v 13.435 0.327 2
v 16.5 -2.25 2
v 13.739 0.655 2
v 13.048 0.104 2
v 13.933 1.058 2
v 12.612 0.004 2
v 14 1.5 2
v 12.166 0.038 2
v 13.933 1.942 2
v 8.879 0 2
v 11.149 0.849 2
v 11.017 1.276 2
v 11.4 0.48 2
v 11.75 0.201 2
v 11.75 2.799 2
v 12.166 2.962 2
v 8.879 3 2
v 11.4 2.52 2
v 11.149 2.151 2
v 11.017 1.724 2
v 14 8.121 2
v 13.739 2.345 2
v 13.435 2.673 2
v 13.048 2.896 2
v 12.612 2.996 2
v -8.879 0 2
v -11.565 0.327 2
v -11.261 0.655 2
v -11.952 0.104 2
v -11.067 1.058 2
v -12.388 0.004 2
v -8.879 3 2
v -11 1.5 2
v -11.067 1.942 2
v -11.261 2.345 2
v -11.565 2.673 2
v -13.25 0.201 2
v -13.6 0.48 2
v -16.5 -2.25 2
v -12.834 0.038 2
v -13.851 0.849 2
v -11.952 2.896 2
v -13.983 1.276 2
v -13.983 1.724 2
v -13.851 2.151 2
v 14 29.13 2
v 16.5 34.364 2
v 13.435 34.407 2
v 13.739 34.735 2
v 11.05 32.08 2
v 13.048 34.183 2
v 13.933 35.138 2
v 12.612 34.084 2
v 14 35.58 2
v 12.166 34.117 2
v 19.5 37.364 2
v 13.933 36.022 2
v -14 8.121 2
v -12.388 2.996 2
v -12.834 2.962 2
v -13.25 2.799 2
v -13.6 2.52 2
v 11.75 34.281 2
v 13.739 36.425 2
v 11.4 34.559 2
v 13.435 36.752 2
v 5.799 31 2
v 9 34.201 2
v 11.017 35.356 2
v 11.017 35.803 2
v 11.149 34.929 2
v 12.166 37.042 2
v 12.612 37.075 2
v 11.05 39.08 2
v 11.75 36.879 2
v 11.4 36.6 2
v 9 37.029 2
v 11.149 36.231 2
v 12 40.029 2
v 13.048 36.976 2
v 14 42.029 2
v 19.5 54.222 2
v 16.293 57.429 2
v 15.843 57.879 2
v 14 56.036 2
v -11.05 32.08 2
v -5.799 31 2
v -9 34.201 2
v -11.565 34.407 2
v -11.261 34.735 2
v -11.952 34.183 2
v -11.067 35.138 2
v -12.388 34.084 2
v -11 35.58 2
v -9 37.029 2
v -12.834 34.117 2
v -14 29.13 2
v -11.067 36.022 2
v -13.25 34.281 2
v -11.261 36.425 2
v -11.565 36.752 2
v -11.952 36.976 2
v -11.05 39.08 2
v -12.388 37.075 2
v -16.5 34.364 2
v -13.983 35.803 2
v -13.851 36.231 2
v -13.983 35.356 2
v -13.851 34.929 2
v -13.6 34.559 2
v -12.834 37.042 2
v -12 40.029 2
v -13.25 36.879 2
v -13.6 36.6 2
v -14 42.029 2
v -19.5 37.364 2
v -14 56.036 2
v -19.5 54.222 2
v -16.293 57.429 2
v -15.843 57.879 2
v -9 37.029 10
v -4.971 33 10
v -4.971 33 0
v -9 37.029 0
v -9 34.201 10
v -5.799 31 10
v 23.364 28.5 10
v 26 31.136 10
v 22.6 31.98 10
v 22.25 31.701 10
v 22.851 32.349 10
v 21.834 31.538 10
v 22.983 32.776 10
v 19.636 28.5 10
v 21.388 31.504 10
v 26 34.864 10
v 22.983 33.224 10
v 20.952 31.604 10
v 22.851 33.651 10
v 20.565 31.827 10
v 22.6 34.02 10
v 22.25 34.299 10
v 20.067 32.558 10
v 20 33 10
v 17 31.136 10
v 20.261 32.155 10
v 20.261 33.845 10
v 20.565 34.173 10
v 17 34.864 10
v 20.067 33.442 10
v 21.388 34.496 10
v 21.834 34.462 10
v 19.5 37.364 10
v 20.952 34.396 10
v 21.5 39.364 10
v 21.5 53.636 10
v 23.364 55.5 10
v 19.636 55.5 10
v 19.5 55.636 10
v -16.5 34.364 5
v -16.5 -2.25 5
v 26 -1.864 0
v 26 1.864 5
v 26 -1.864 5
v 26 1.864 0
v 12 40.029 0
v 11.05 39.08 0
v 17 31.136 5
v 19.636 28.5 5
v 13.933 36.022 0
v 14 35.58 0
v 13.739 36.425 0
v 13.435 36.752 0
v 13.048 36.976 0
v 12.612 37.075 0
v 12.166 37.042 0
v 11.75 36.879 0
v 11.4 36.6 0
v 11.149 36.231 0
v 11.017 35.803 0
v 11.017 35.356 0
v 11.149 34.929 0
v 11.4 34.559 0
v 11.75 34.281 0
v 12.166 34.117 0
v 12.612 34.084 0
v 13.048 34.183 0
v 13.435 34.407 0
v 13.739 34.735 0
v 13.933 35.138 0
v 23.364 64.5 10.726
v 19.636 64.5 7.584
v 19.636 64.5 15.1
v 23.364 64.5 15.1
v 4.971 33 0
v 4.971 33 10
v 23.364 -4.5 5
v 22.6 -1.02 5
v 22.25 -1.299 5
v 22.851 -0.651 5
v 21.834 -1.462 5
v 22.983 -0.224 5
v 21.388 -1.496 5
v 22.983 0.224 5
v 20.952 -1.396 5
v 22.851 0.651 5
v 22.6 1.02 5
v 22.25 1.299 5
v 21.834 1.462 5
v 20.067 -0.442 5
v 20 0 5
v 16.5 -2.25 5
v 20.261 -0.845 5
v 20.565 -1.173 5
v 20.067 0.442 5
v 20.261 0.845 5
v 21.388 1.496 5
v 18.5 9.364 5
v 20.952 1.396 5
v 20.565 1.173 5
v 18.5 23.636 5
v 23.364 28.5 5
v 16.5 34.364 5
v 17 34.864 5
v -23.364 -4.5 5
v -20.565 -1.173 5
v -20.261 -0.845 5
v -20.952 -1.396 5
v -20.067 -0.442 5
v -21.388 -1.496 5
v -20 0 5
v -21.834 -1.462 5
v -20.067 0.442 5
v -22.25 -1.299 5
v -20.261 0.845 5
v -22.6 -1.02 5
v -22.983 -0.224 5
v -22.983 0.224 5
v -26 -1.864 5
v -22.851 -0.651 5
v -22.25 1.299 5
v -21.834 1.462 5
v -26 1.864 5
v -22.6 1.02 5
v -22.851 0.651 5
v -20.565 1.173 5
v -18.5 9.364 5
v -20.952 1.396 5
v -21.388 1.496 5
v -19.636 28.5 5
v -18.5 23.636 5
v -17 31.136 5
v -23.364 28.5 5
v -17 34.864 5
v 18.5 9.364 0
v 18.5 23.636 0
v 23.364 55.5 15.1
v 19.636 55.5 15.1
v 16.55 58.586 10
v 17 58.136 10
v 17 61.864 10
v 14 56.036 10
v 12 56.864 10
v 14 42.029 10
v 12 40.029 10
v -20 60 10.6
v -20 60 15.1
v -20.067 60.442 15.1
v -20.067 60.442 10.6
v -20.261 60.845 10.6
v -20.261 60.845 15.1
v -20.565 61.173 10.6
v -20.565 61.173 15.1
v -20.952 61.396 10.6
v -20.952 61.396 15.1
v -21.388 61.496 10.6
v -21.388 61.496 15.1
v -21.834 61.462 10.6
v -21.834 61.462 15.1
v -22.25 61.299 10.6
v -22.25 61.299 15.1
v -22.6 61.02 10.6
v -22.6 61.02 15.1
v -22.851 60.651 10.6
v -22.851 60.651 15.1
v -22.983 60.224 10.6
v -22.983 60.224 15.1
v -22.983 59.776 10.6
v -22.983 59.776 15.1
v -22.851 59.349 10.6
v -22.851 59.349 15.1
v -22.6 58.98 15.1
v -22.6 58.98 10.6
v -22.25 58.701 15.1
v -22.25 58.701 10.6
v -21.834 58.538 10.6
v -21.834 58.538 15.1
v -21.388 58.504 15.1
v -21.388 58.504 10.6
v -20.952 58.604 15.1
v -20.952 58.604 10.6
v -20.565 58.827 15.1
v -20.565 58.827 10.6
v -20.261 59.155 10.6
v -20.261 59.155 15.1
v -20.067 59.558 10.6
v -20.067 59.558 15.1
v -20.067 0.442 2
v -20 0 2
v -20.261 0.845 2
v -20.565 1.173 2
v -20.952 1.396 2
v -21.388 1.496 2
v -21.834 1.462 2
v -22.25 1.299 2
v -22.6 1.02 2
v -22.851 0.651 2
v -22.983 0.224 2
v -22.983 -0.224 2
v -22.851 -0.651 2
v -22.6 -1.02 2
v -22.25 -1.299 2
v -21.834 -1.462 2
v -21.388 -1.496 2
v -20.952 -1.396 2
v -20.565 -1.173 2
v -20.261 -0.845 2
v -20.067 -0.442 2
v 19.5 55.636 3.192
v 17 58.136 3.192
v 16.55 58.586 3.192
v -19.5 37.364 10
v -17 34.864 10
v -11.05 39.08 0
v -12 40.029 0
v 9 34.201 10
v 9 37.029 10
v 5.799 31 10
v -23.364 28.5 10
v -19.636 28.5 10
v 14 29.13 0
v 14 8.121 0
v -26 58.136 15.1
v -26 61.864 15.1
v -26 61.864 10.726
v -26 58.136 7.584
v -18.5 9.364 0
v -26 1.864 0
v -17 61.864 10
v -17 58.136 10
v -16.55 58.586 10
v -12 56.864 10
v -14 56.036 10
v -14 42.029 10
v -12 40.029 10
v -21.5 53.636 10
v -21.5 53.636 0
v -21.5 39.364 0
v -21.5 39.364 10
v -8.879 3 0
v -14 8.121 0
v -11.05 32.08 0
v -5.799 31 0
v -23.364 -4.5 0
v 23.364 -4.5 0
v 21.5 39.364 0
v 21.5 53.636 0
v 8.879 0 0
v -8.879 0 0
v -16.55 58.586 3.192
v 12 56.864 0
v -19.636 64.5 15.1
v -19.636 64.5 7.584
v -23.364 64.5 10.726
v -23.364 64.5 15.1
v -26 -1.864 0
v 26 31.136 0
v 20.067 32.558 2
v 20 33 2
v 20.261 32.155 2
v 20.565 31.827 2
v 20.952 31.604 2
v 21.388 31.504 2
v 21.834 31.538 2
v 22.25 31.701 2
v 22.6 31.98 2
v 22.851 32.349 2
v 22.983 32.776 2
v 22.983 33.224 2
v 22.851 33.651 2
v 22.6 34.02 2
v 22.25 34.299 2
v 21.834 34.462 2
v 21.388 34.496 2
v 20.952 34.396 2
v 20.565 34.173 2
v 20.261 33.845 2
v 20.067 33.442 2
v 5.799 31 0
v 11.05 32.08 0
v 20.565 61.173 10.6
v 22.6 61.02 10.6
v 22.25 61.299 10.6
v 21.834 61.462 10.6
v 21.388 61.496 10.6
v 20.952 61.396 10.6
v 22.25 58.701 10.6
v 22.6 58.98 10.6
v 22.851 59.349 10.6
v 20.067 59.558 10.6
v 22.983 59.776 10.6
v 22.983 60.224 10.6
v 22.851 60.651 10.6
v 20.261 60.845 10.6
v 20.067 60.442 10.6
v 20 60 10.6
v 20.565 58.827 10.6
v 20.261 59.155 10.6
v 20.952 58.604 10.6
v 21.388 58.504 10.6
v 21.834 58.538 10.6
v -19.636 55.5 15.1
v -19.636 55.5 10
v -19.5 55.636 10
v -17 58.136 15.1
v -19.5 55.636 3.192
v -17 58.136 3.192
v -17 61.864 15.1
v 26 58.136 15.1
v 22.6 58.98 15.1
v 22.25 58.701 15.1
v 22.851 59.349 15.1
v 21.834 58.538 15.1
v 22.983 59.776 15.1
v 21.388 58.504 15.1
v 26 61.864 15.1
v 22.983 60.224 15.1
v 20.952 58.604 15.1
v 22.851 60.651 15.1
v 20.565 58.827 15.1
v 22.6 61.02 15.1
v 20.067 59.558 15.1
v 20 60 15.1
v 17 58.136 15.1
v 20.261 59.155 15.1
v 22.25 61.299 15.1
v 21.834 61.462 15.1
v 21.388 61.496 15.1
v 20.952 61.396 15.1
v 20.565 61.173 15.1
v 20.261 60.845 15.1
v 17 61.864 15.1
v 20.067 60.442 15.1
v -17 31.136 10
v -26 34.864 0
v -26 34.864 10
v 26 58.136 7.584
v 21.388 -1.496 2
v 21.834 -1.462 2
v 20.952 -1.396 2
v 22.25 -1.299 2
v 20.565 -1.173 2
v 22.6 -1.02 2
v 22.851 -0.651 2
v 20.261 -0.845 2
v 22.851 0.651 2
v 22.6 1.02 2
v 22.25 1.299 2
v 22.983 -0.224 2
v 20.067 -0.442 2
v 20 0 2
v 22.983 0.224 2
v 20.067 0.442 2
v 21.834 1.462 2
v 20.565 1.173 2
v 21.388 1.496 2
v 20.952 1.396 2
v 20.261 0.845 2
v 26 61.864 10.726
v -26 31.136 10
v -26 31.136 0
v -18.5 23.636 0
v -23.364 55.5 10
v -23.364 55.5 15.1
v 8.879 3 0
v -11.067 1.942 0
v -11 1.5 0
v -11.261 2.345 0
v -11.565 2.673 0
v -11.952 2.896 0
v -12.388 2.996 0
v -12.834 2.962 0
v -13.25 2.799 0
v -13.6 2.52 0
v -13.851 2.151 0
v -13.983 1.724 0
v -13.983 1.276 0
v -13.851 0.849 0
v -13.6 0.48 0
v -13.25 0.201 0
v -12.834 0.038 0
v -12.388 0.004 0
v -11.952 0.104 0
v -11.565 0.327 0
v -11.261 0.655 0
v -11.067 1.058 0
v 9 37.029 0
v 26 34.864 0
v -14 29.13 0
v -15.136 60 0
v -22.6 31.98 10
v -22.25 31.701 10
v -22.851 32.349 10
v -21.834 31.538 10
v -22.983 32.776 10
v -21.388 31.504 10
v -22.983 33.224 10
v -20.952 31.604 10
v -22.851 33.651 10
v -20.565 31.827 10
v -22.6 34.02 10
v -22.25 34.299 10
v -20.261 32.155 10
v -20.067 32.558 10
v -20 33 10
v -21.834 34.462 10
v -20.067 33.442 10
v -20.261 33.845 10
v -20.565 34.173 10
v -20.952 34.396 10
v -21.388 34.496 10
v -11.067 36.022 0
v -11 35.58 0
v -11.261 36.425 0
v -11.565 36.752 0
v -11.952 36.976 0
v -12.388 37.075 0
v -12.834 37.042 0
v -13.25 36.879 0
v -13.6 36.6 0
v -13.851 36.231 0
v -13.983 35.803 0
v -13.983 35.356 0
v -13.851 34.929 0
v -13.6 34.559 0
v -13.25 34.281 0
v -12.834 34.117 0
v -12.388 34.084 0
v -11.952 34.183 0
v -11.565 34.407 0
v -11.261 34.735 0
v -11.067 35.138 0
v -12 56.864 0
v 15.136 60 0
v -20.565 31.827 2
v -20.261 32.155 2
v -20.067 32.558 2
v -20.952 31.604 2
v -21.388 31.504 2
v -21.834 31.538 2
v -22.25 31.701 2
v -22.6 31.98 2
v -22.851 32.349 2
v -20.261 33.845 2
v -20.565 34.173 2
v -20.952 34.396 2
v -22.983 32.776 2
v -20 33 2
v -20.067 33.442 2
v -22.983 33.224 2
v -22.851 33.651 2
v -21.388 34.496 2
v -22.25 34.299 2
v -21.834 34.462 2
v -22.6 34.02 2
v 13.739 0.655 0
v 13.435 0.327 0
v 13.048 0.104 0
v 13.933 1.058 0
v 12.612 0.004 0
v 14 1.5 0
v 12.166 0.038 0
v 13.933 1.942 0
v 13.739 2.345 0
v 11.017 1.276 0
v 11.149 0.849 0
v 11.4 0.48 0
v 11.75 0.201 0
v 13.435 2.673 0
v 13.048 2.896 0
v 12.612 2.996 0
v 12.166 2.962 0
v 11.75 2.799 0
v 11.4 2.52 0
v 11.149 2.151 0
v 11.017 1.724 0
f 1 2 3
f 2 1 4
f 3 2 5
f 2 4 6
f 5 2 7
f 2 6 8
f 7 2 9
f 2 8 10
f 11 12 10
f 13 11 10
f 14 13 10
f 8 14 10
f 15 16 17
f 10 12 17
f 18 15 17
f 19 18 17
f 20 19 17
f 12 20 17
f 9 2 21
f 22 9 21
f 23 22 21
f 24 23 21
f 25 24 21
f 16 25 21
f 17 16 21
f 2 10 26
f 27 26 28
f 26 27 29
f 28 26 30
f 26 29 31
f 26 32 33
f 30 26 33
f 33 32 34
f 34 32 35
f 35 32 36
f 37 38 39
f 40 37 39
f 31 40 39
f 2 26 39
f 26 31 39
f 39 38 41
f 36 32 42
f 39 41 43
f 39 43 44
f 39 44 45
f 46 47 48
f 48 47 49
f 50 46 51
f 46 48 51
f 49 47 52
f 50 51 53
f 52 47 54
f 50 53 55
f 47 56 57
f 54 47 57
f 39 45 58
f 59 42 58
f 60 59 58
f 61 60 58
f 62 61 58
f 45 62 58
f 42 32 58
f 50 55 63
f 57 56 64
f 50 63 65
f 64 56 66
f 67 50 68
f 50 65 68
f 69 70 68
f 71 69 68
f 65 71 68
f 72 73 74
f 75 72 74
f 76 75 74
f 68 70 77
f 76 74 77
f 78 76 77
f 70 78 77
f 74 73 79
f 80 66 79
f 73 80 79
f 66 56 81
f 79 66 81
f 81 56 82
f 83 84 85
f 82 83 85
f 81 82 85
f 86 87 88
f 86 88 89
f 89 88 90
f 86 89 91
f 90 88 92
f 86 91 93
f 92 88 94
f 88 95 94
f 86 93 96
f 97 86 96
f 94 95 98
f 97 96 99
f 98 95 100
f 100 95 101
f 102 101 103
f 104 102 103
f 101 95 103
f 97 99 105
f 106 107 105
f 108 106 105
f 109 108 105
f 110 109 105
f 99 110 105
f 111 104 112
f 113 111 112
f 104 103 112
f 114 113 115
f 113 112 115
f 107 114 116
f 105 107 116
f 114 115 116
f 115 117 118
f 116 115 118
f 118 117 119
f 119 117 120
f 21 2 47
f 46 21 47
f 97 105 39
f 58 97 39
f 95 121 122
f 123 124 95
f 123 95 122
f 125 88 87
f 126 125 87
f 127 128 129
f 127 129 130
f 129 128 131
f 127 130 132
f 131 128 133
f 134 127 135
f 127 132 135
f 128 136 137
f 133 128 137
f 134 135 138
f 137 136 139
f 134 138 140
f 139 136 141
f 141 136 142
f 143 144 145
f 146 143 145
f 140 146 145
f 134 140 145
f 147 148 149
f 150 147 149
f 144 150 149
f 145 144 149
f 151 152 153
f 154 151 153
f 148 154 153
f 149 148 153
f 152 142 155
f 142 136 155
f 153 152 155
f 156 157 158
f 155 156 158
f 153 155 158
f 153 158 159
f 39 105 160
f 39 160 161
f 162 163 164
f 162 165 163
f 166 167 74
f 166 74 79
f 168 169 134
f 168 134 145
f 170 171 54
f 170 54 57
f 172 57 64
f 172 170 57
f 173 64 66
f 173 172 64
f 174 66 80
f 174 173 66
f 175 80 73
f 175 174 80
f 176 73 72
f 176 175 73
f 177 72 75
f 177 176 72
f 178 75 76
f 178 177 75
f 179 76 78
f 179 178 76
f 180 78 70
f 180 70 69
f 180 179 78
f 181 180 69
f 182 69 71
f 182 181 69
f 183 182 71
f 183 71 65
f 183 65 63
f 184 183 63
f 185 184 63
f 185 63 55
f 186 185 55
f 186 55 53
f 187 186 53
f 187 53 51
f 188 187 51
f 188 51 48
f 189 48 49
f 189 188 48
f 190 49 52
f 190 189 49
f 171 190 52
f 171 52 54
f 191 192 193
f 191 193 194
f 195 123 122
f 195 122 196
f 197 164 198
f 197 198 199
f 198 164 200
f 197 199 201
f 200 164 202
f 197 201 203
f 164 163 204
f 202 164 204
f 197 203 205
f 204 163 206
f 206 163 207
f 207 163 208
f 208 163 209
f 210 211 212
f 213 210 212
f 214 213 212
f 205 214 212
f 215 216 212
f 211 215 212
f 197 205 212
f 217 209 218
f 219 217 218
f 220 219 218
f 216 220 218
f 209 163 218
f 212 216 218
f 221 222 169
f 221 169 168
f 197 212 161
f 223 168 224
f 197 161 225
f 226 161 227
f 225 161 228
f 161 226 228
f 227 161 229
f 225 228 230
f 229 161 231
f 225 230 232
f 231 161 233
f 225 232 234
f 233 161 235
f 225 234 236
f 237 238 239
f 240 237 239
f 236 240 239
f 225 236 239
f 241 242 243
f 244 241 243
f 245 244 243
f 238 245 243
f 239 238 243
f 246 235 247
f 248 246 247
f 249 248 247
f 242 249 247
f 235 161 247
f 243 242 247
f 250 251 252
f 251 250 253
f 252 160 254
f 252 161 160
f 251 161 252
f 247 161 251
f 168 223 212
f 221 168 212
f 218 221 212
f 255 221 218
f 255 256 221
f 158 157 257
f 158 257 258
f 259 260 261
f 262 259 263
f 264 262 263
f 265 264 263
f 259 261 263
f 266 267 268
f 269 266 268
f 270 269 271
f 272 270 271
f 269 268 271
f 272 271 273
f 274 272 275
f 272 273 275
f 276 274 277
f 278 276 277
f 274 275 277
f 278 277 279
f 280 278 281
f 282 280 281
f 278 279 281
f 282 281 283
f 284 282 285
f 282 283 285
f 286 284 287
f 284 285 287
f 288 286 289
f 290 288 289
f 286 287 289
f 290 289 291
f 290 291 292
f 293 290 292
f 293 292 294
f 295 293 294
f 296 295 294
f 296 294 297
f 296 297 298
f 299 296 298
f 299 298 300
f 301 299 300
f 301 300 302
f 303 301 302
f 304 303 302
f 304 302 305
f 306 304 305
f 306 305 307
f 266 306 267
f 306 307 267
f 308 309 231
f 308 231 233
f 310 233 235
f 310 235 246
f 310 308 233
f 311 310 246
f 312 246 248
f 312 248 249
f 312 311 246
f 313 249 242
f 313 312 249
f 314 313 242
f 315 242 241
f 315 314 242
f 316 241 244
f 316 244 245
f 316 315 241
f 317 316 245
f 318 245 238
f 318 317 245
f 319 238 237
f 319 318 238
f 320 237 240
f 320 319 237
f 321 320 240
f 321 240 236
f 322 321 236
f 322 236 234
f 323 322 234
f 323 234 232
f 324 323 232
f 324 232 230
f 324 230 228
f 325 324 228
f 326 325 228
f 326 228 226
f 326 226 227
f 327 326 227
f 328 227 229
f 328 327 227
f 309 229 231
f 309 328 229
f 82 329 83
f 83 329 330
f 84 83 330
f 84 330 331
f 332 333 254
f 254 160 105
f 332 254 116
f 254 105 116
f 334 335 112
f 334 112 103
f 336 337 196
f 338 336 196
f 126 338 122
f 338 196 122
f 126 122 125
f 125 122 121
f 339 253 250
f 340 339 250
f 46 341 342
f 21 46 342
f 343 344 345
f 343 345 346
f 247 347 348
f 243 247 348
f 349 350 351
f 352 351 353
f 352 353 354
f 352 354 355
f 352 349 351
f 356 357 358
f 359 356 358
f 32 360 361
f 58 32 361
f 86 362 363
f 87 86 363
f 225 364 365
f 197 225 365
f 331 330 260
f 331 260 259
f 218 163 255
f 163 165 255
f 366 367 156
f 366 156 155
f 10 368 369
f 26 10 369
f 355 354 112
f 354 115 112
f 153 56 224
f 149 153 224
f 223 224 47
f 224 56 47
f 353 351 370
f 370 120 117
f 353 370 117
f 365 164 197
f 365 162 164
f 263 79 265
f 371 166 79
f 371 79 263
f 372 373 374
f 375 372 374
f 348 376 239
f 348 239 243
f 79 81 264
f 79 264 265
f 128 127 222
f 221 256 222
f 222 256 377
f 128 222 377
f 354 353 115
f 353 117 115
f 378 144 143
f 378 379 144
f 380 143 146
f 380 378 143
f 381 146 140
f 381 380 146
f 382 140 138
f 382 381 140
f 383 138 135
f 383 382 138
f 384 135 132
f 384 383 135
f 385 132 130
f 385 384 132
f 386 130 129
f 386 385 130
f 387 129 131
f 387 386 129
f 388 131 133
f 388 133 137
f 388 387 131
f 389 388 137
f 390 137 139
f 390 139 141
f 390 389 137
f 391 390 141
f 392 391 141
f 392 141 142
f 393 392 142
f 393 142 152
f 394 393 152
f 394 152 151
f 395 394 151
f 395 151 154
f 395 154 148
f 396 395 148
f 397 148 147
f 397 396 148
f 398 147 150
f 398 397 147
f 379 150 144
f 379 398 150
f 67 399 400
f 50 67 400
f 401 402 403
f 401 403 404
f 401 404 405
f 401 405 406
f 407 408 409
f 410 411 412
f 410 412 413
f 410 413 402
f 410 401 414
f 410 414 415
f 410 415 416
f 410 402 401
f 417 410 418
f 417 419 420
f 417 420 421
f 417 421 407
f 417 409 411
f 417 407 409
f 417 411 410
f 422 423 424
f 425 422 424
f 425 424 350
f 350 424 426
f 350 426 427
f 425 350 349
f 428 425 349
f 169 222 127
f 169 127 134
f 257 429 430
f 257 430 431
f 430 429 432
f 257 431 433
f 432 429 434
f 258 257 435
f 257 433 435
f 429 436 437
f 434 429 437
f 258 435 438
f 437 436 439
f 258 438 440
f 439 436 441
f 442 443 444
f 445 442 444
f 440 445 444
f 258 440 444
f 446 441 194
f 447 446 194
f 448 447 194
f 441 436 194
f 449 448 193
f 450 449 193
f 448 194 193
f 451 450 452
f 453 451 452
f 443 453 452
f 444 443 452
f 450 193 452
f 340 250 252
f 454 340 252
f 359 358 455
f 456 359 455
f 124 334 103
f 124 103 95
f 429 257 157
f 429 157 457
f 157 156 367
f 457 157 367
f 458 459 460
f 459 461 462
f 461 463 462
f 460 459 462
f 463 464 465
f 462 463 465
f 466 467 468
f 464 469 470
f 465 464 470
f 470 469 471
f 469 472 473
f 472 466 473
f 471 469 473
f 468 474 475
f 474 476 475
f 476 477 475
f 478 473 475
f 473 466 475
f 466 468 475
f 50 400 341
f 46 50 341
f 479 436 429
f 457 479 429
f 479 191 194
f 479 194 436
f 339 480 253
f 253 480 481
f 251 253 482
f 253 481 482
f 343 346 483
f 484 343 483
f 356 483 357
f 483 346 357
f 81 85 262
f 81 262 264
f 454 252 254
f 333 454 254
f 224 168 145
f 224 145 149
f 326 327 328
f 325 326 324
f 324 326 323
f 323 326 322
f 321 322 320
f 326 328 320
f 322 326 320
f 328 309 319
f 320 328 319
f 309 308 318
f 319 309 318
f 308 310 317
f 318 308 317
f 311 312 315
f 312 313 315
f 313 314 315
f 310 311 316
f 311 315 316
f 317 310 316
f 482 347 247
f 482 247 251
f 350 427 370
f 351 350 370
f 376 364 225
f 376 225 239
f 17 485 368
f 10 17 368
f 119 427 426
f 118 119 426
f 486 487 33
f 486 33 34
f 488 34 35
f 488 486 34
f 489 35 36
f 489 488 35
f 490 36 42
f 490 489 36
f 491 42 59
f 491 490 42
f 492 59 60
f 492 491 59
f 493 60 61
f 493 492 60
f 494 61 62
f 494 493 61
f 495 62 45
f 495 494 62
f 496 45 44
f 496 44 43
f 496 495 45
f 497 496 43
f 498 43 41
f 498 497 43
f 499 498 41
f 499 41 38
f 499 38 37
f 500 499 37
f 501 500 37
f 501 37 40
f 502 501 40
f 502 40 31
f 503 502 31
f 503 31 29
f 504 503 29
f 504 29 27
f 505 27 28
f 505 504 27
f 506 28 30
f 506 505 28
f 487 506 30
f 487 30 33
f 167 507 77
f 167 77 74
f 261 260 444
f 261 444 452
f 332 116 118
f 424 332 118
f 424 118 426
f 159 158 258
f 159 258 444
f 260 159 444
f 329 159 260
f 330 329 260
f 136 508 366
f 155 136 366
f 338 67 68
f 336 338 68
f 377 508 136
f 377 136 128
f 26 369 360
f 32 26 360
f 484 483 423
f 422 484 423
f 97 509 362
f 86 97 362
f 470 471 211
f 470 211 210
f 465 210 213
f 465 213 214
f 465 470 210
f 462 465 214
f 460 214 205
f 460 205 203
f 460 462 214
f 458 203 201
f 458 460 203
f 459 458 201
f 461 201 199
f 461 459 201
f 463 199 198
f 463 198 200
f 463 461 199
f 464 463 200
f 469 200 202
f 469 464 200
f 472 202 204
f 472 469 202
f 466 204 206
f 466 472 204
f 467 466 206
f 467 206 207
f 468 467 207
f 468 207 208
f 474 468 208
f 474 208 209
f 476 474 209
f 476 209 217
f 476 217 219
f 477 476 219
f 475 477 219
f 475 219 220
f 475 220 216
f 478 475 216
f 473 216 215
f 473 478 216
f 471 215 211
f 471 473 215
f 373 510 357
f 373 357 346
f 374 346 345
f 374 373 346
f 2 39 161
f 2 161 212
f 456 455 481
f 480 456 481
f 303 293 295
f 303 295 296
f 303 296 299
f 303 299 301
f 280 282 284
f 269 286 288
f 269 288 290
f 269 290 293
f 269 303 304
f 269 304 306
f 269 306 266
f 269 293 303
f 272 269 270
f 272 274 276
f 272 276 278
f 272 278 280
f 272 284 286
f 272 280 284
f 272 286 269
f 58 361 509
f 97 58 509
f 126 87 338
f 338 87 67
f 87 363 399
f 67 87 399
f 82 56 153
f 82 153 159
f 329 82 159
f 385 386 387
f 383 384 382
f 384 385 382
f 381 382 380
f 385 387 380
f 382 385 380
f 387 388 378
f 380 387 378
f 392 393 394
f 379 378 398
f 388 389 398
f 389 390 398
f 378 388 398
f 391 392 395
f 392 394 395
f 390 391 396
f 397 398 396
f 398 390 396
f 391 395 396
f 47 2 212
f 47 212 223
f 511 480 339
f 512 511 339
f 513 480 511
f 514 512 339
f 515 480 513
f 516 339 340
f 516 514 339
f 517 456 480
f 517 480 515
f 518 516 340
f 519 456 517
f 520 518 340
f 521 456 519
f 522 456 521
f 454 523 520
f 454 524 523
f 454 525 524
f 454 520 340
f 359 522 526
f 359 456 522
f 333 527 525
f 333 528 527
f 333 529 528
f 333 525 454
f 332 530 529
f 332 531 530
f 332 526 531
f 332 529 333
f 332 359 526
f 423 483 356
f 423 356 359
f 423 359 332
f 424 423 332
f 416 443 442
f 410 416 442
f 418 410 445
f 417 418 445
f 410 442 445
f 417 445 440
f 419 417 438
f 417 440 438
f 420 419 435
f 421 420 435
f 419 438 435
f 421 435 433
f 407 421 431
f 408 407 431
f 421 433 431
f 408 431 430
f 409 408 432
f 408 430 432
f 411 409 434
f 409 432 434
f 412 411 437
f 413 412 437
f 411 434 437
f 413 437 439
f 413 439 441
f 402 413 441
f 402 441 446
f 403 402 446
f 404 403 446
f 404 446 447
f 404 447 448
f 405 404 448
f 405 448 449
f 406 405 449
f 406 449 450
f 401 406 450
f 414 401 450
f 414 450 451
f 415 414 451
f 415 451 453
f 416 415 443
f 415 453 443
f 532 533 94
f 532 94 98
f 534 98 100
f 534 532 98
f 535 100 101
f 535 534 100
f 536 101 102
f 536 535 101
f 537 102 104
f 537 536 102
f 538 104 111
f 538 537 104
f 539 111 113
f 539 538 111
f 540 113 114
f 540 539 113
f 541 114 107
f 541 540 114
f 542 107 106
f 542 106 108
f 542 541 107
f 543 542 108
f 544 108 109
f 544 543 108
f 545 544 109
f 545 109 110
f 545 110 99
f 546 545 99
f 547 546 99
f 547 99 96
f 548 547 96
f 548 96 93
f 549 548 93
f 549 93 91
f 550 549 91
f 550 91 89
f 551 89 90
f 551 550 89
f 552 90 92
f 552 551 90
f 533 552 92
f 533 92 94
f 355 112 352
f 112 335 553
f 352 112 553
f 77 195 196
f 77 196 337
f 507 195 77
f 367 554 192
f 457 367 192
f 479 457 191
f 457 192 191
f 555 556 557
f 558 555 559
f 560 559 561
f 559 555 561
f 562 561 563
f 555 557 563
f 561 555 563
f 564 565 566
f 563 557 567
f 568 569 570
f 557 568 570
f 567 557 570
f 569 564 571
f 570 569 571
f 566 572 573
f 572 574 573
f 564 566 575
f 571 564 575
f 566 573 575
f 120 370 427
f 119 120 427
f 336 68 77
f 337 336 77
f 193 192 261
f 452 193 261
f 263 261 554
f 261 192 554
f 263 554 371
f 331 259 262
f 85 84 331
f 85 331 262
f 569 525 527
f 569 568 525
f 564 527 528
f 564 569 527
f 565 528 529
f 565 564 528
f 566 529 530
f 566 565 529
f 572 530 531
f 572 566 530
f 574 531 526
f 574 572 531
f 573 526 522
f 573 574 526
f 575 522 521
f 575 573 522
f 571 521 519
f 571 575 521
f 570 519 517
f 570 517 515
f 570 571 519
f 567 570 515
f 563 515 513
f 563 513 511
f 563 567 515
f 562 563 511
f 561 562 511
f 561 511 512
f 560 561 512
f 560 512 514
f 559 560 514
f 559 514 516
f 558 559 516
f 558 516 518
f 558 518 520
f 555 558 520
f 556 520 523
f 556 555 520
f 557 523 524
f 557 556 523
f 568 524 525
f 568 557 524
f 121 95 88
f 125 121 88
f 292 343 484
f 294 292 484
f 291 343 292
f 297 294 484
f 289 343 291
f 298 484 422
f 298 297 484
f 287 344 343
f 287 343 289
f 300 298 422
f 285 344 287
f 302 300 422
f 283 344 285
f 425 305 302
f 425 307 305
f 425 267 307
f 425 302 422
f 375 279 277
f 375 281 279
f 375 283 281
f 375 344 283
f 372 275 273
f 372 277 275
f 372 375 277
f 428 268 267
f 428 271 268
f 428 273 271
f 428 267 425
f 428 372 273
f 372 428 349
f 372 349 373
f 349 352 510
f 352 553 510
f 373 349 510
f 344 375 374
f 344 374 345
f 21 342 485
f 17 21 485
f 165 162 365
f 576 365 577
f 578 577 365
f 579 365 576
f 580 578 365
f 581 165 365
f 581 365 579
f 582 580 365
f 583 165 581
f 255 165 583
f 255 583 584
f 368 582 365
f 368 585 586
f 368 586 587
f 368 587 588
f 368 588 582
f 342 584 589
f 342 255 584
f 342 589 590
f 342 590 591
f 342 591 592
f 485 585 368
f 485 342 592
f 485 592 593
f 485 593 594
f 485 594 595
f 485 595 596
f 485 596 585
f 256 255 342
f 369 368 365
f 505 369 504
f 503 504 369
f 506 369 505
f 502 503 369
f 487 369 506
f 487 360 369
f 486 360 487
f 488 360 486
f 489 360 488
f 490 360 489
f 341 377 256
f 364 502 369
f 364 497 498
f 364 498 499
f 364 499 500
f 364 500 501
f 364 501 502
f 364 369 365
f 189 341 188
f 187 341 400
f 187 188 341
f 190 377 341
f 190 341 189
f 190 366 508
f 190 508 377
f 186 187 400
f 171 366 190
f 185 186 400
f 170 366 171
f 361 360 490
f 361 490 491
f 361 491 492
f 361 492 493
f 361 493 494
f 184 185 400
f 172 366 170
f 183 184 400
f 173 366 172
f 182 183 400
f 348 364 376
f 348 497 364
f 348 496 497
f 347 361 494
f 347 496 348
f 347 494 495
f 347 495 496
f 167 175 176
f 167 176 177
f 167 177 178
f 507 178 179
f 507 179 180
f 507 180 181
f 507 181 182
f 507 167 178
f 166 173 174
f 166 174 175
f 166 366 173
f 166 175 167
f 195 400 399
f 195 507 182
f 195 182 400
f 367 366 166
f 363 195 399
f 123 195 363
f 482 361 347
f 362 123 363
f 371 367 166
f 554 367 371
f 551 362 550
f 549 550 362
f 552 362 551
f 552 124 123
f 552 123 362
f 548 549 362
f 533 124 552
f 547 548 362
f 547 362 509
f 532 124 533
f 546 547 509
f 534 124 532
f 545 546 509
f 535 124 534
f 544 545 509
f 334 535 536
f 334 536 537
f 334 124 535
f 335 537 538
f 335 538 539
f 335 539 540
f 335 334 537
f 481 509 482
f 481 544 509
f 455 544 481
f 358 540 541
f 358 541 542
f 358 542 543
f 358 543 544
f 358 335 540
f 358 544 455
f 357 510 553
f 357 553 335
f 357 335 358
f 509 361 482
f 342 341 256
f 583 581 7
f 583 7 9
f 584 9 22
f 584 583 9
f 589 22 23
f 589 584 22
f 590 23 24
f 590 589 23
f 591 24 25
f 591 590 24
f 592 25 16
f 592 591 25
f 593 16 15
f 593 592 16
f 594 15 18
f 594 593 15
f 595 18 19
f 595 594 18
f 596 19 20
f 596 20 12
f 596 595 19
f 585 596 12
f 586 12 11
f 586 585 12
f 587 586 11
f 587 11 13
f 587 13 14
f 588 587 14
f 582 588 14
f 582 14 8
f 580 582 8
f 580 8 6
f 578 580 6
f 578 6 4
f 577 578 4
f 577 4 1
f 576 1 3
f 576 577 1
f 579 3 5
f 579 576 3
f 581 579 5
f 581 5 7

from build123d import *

# Parameters (mm, degrees)
SKETCH5_R           = 1.5
BOSS_EXTRUDE1_DEPTH = 2
SKETCH9_R           = 1.5
BOSS_EXTRUDE3_DEPTH = 3
SKETCH10_R          = 1.5
BOSS_EXTRUDE4_DEPTH = 5
BOSS_EXTRUDE5_DEPTH = 5.1
SKETCH13_R          = 1.5
CUT_EXTRUDE1_DEPTH  = 4.5
CUT_EXTRUDE2_DEPTH  = 7.5
CUT_EXTRUDE3_DEPTH  = 7.5
CHAMFER1_SIZE       = 1
CHAMFER1_SIZE2      = 1.191753593


with BuildPart() as part:
    # Sketch5 → Boss-Extrude1 (new body)
    with BuildSketch(Plane.XY):
        Polygon((19.636038969, -4.5), (-19.636038969, -4.5), (-23.363961031, -4.5), (-26, -1.863961031), (-26, 1.863961031), (-23.363961031, 4.5), (-18.5, 9.363961031), (-18.5, 23.636038969), (-23.363961031, 28.5), (-26, 31.136038969), (-26, 34.863961031), (-23.363961031, 37.5), (-21.5, 39.363961031), (-21.5, 53.636038969), (-23.363961031, 55.5), (-26, 58.136038969), (-26, 61.863961031), (-23.363961031, 64.5), (-19.636038969, 64.5), (-17, 61.863961031), (-12, 56.863961031), (-12, 40.029437252), (-11.050252532, 39.079689783), (-9, 37.029437252), (-4.970562748, 33), (4.970562748, 33), (9, 37.029437252), (11.050252532, 39.079689783), (12, 40.029437252), (12, 56.863961031), (17, 61.863961031), (19.636038969, 64.5), (23.363961031, 64.5), (26, 61.863961031), (26, 58.136038969), (23.363961031, 55.5), (21.5, 53.636038969), (21.5, 39.363961031), (23.363961031, 37.5), (26, 34.863961031), (26, 31.136038969), (23.363961031, 28.5), (18.5, 23.636038969), (18.5, 9.363961031), (23.363961031, 4.5), (26, 1.863961031), (26, -1.863961031), (23.363961031, -4.5), align=None)
        with Locations((-12.5, 35.579689783)):
            Circle(SKETCH5_R, mode=Mode.SUBTRACT)
        with Locations((-12.5, 1.5)):
            Circle(SKETCH5_R, mode=Mode.SUBTRACT)
        with Locations((12.5, 1.5)):
            Circle(SKETCH5_R, mode=Mode.SUBTRACT)
        with Locations((12.5, 35.579689783)):
            Circle(SKETCH5_R, mode=Mode.SUBTRACT)
        Polygon((-5.798989873, 31), (5.798989873, 31), (11.050252532, 32.079689783), (14, 29.129942315), (14, 8.121320344), (11, 5.121320344), (8.878679656, 3), (8.878679656, 0), (-8.878679656, 0), (-8.878679656, 3), (-11, 5.121320344), (-14, 8.121320344), (-14, 29.129942315), (-11.050252532, 32.079689783), align=None, mode=Mode.SUBTRACT)
    extrude(amount=BOSS_EXTRUDE1_DEPTH)

    # Sketch9 → Boss-Extrude3 (add)
    # profile 1 of 2: a face of its own
    with BuildSketch(Plane.XY.offset(2)):
        Polygon((19.636038969, -4.5), (-19.636038969, -4.5), (-23.363961031, -4.5), (-26, -1.863961031), (-26, 1.863961031), (-23.363961031, 4.5), (-18.5, 9.363961031), (-18.5, 23.636038969), (-23.363961031, 28.5), (-26, 31.136038969), (-26, 34.863961031), (-23.363961031, 37.5), (-21.5, 39.363961031), (-21.5, 53.636038969), (-23.363961031, 55.5), (-26, 58.136038969), (-26, 61.863961031), (-23.363961031, 64.5), (-19.636038969, 64.5), (-17, 61.863961031), (-12, 56.863961031), (-12, 40.029437252), (-14, 42.029437252), (-14, 56.035533906), (-16.550252532, 58.585786438), (-17, 58.136038969), (-19.5, 55.636038969), (-19.5, 37.363961031), (-17, 34.863961031), (-16.5, 34.363961031), (-16.5, -2.25), (16.5, -2.25), (16.5, 34.363961031), (17, 34.863961031), (19.5, 37.363961031), (19.5, 55.636038969), (17, 58.136038969), (16.550252532, 58.585786438), (14, 56.035533906), (14, 42.029437252), (12, 40.029437252), (12, 56.863961031), (17, 61.863961031), (19.636038969, 64.5), (23.363961031, 64.5), (26, 61.863961031), (26, 58.136038969), (23.363961031, 55.5), (21.5, 53.636038969), (21.5, 39.363961031), (23.363961031, 37.5), (26, 34.863961031), (26, 31.136038969), (23.363961031, 28.5), (18.5, 23.636038969), (18.5, 9.363961031), (23.363961031, 4.5), (26, 1.863961031), (26, -1.863961031), (23.363961031, -4.5), align=None)
        with Locations((-21.5, 0)):
            Circle(SKETCH9_R, mode=Mode.SUBTRACT)
        with Locations((-21.5, 33)):
            Circle(SKETCH9_R, mode=Mode.SUBTRACT)
        with Locations(Location((21.5, 33, 0), (0, 0, 180))):
            Circle(SKETCH9_R, mode=Mode.SUBTRACT)
        with Locations(Location((21.5, 0, 0), (0, 0, 180))):
            Circle(SKETCH9_R, mode=Mode.SUBTRACT)
    # profile 2 of 2: a face of its own
    with BuildSketch(Plane.XY.offset(2)):
        Polygon((4.970562748, 33), (-4.970562748, 33), (-9, 37.029437252), (-9, 34.201010127), (-5.798989873, 31), (5.798989873, 31), (9, 34.201010127), (9, 37.029437252), align=None)
    extrude(amount=BOSS_EXTRUDE3_DEPTH)

    # Sketch10 → Boss-Extrude4 (add)
    # profile 1 of 3: a face of its own
    with BuildSketch(Plane.XY.offset(5)):
        Polygon((-23.363961031, 28.5), (-19.636038969, 28.5), (-17, 31.136038969), (-17, 34.863961031), (-19.5, 37.363961031), (-19.5, 55.636038969), (-17, 58.136038969), (-16.550252532, 58.585786438), (-14, 56.035533906), (-14, 42.029437252), (-12, 40.029437252), (-12, 56.863961031), (-17, 61.863961031), (-19.636038969, 64.5), (-23.363961031, 64.5), (-26, 61.863961031), (-26, 58.136038969), (-23.363961031, 55.5), (-21.5, 53.636038969), (-21.5, 39.363961031), (-23.363961031, 37.5), (-26, 34.863961031), (-26, 31.136038969), align=None)
        with Locations((-21.5, 33)):
            Circle(SKETCH10_R, mode=Mode.SUBTRACT)
    # profile 2 of 3: a face of its own
    with BuildSketch(Plane.XY.offset(5)):
        Polygon((-9, 34.201010127), (-9, 37.029437252), (-4.970562748, 33), (4.970562748, 33), (9, 37.029437252), (9, 34.201010127), (5.798989873, 31), (-5.798989873, 31), align=None)
    # profile 3 of 3: a face of its own
    with BuildSketch(Plane.XY.offset(5)):
        Polygon((19.636038969, 28.5), (17, 31.136038969), (17, 34.863961031), (19.5, 37.363961031), (19.5, 55.636038969), (17, 58.136038969), (16.550252532, 58.585786438), (14, 56.035533906), (14, 42.029437252), (12, 40.029437252), (12, 56.863961031), (17, 61.863961031), (19.636038969, 64.5), (23.363961031, 64.5), (26, 61.863961031), (26, 58.136038969), (23.363961031, 55.5), (21.5, 53.636038969), (21.5, 39.363961031), (23.363961031, 37.5), (26, 34.863961031), (26, 31.136038969), (23.363961031, 28.5), align=None)
        with Locations(Location((21.5, 33, 0), (0, 0, 180))):
            Circle(SKETCH10_R, mode=Mode.SUBTRACT)
    extrude(amount=BOSS_EXTRUDE4_DEPTH)

    # Sketch12 → Boss-Extrude5 (add)
    with BuildSketch(Plane.XY.offset(10)):
        Polygon((-26, 58.136038969), (-23.363961031, 55.5), (-19.636038969, 55.5), (-17, 58.136038969), (-17, 61.863961031), (-19.636038969, 64.5), (-23.363961031, 64.5), (-26, 61.863961031), align=None)
        Polygon((17, 58.136038969), (17, 61.863961031), (19.636038969, 64.5), (23.363961031, 64.5), (26, 61.863961031), (26, 58.136038969), (23.363961031, 55.5), (19.636038969, 55.5), align=None)
    extrude(amount=BOSS_EXTRUDE5_DEPTH)

    # Sketch13 → Cut-Extrude1 (cut)
    with BuildSketch(Plane.XY.offset(15.1)):
        with Locations((-21.5, 60)):
            Circle(SKETCH13_R)
        with Locations(Location((21.5, 60, 0), (0, 0, 180))):
            Circle(SKETCH13_R)
    extrude(amount=-CUT_EXTRUDE1_DEPTH, mode=Mode.SUBTRACT)

    # Sketch15 → Cut-Extrude2 (cut, symmetric)
    with BuildSketch(Plane(origin=(19.25, 19.25, 0), x_dir=(0, 0, -1), z_dir=(0.7071067811865485, 0.7071067811865467, 0))):
        Polygon((0, 53.129202667), (-15.320888862, 65.98495486), (-8.893012766, 73.645399292), (6.427876097, 60.789647098), align=None)
    extrude(amount=CUT_EXTRUDE2_DEPTH, both=True, mode=Mode.SUBTRACT)

    # Sketch16 → Cut-Extrude3 (cut, symmetric)
    with BuildSketch(Plane(origin=(-19.25, 19.25, 0), x_dir=(0.7071067811865477, 0.7071067811865474, 0), z_dir=(-0.7071067811865474, 0.7071067811865477, 0))):
        Polygon((53.129202667, 0), (65.98495486, -15.320888862), (73.645399292, -8.893012766), (60.789647098, 6.427876097), align=None)
    extrude(amount=CUT_EXTRUDE3_DEPTH, both=True, mode=Mode.SUBTRACT)

    # Chamfer1
    chamfer1_edges = [part.edges().sort_by_distance(p)[0] for p in [
        (18.025126266, 57.110912703, 2),
        (-18.025126266, 57.110912703, 2),
    ]]
    chamfer1_side = [part.faces().sort_by_distance(p)[0] for p in [
        (-13.510979105, 40.518458147, 2),
    ]]
    chamfer(chamfer1_edges, length=CHAMFER1_SIZE, length2=CHAMFER1_SIZE2, reference=chamfer1_side[0])


solid = part.part
